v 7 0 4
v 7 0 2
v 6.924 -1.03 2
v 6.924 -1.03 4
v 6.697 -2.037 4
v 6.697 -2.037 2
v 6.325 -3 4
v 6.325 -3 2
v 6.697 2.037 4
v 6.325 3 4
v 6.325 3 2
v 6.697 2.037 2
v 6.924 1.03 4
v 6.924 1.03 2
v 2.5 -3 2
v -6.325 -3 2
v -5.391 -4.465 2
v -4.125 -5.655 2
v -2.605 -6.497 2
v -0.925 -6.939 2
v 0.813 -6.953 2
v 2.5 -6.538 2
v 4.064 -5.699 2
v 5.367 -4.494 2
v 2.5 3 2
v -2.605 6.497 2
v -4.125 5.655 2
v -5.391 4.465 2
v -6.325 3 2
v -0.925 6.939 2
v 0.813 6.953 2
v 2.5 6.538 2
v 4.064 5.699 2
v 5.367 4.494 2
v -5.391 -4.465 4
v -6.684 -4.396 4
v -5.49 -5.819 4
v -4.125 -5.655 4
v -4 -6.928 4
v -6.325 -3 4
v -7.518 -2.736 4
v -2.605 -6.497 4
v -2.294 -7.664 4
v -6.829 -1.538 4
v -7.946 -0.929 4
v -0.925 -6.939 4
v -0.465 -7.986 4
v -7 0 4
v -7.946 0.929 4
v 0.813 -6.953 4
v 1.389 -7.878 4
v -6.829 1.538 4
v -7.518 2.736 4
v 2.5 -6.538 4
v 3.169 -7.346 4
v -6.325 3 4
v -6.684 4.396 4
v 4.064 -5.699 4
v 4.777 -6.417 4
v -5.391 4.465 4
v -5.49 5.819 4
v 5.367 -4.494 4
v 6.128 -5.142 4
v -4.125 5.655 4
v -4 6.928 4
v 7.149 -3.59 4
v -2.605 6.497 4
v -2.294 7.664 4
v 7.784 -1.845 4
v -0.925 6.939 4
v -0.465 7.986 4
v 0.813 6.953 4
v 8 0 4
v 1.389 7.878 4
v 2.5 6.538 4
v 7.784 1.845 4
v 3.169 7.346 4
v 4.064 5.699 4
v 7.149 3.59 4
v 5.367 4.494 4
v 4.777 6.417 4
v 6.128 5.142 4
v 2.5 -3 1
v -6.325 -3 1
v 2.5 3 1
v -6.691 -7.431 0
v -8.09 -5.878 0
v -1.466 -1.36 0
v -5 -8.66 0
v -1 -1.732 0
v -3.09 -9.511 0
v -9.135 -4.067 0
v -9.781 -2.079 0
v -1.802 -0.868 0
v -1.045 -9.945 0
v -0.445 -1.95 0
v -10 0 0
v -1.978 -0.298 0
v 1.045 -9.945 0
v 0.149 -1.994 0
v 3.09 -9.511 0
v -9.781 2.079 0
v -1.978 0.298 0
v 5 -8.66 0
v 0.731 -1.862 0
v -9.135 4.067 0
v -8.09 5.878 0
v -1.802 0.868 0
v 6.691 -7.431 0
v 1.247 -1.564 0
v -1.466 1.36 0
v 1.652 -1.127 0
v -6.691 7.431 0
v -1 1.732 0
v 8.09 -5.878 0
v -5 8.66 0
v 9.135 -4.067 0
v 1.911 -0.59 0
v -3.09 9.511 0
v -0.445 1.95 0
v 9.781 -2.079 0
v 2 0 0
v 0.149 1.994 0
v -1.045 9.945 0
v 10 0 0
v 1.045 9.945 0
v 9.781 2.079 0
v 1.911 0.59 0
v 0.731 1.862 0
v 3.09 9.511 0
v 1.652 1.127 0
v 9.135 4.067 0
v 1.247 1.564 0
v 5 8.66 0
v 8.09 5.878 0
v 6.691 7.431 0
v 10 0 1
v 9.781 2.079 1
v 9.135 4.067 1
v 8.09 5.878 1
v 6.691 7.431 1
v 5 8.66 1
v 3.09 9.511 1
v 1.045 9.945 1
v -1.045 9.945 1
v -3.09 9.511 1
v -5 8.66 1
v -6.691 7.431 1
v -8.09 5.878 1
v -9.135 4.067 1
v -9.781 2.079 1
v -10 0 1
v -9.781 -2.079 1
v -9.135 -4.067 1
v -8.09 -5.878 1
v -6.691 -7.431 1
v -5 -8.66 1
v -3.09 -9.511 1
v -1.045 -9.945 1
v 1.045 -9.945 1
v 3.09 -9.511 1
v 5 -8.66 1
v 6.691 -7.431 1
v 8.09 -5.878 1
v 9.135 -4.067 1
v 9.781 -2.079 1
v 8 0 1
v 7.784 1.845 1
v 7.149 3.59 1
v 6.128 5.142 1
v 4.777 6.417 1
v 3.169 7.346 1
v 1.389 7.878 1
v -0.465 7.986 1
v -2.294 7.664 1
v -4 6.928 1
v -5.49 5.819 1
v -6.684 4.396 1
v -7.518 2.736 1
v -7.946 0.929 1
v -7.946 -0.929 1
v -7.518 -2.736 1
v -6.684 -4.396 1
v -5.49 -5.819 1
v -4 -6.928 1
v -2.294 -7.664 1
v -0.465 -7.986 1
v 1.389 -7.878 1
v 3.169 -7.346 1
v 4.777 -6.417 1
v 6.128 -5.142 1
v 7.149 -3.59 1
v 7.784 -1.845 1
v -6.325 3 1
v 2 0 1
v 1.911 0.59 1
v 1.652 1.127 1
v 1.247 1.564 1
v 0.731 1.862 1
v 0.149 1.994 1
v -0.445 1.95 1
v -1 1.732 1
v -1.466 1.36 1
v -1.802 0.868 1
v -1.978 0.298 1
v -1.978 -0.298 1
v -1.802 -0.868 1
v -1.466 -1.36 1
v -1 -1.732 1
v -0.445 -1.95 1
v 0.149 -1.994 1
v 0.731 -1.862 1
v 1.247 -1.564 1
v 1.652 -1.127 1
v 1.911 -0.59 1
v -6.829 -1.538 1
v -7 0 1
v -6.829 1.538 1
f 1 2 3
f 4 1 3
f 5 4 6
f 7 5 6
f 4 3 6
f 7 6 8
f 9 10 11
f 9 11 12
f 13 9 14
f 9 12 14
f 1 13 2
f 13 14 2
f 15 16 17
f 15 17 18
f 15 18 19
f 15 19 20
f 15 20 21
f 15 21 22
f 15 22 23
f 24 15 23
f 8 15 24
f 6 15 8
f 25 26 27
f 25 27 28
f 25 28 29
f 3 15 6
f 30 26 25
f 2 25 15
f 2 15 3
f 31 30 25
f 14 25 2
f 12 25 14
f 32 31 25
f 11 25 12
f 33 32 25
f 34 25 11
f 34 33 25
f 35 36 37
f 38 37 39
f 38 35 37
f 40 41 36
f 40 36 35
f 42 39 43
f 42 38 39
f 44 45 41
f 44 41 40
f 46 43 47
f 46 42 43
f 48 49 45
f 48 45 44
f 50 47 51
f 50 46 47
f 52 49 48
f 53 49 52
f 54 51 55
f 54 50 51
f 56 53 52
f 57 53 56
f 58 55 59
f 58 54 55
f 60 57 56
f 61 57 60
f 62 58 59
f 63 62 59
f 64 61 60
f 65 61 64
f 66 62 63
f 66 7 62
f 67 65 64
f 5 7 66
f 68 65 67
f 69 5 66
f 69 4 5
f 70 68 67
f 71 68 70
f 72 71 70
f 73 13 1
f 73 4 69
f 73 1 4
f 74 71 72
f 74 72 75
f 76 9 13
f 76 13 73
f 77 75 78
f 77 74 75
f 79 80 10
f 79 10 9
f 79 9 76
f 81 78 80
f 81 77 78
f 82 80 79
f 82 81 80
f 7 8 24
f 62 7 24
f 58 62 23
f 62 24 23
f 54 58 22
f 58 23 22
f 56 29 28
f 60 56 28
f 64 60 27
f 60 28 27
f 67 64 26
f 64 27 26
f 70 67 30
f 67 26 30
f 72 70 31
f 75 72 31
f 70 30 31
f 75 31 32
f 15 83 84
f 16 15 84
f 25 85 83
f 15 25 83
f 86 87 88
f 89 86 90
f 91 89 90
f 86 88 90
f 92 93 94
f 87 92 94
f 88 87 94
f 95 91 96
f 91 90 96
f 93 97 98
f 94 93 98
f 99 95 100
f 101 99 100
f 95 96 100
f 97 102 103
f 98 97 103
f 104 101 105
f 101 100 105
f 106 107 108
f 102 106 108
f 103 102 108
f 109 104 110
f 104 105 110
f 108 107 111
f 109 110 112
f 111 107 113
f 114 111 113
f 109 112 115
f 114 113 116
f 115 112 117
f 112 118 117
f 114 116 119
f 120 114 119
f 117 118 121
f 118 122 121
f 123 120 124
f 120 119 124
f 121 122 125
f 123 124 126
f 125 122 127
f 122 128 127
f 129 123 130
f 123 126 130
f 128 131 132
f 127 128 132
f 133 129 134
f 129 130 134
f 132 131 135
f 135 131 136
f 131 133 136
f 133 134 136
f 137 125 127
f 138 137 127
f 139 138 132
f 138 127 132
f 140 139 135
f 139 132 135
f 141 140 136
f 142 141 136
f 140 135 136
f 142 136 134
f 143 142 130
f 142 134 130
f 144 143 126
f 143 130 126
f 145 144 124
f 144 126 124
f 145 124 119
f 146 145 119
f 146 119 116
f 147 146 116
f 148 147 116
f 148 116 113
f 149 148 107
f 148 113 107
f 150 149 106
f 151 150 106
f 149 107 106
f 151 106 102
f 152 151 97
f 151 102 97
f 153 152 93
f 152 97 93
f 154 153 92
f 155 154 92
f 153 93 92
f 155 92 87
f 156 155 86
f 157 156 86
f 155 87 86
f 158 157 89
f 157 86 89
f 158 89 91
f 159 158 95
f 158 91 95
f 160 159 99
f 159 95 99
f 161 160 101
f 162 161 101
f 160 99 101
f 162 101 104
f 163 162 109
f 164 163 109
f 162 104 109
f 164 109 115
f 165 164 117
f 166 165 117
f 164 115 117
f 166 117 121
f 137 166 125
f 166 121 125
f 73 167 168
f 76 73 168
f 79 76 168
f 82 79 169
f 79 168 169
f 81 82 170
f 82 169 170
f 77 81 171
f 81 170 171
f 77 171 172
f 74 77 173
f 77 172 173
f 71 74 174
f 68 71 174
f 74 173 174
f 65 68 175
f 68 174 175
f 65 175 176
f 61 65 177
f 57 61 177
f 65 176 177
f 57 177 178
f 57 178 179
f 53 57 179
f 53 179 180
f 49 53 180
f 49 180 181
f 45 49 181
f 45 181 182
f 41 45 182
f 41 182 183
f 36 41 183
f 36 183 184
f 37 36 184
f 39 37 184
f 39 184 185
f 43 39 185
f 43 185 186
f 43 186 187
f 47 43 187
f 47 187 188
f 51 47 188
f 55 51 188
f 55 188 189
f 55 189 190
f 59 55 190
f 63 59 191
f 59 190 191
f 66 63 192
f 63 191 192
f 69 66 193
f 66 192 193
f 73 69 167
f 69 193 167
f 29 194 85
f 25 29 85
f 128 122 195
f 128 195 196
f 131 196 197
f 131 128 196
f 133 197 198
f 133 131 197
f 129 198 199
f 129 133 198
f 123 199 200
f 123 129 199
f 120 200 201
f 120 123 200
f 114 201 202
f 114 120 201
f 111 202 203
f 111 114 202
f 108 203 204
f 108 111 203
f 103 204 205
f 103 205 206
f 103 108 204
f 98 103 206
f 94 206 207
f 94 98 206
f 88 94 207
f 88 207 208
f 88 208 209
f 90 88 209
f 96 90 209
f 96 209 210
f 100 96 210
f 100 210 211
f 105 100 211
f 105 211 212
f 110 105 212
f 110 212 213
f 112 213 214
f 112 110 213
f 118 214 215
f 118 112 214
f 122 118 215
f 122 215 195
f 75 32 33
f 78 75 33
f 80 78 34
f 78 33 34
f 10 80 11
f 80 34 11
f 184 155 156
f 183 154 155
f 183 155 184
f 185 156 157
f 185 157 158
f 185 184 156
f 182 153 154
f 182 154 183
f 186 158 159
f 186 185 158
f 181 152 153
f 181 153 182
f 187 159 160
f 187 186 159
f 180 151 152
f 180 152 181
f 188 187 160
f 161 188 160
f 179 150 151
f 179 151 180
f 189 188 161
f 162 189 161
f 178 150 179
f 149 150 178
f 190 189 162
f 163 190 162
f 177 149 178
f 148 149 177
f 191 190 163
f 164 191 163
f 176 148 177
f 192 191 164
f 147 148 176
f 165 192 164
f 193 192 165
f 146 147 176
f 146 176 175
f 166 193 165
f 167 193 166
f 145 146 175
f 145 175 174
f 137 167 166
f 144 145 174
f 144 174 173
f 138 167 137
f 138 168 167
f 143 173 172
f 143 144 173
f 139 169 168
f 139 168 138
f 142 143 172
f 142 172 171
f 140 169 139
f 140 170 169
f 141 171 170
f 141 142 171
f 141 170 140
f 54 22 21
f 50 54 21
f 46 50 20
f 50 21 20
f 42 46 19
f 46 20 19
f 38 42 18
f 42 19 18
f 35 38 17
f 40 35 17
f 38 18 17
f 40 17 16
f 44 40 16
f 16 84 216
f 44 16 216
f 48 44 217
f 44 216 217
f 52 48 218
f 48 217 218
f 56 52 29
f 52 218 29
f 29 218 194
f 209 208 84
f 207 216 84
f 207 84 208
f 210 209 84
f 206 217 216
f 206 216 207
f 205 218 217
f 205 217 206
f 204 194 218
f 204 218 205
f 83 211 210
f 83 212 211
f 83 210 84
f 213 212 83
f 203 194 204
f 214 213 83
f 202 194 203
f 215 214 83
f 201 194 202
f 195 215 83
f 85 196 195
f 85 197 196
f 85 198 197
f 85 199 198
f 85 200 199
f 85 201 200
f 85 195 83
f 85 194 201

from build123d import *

# Parameters (mm, degrees)
F0_R     = 10
F0_R_2   = 8
F0_R_3   = 2
F1_DEPTH = 1
F2_DEPTH = 4
F3_DEPTH = 2


with BuildPart() as f1:
    # F0 (on Top) → F1 (new body)
    with BuildSketch(Plane.XY):
        Circle(F0_R)
        Circle(F0_R_2, mode=Mode.SUBTRACT)
        Circle(F0_R_2)
        with BuildLine():
            ThreePointArc((6.3245553203, 3), (6.8290514437, 1.5375488216), (7, 0))
            ThreePointArc((7, 0), (6.8290514437, -1.5375488216), (6.3245553203, -3))
            ThreePointArc((6.3245553203, -3), (4.7537534147, -5.1382709614), (2.5, -6.5383484153))
            ThreePointArc((2.5, -6.5383484153), (-2.6051455289, -6.4971699049), (-6.3245553203, -3))
            ThreePointArc((-6.3245553203, -3), (-7, 0), (-6.3245553203, 3))
            ThreePointArc((-6.3245553203, 3), (-2.6051455289, 6.4971699049), (2.5, 6.5383484153))
            ThreePointArc((2.5, 6.5383484153), (4.7537534147, 5.1382709614), (6.3245553203, 3))
        make_face(mode=Mode.SUBTRACT)
        with BuildLine():
            Line((2.5, -3), (2.5, 3))
            Line((2.5, 3), (-6.3245553203, 3))
            ThreePointArc((-6.3245553203, 3), (-7, 0), (-6.3245553203, -3))
            Line((-6.3245553203, -3), (2.5, -3))
        make_face()
        Circle(F0_R_3, mode=Mode.SUBTRACT)
        with BuildLine():
            Line((2.5, 3), (2.5, 6.5383484153))
            ThreePointArc((2.5, 6.5383484153), (-2.6051455289, 6.4971699049), (-6.3245553203, 3))
            Line((-6.3245553203, 3), (2.5, 3))
        make_face()
        with BuildLine():
            ThreePointArc((-6.3245553203, -3), (-2.6051455289, -6.4971699049), (2.5, -6.5383484153))
            Line((2.5, -6.5383484153), (2.5, -3))
            Line((2.5, -3), (-6.3245553203, -3))
        make_face()
        with BuildLine():
            ThreePointArc((6.3245553203, -3), (6.8290514437, -1.5375488216), (7, 0))
            ThreePointArc((7, 0), (6.8290514437, 1.5375488216), (6.3245553203, 3))
            Line((6.3245553203, 3), (2.5, 3))
            Line((2.5, 3), (2.5, -3))
            Line((2.5, -3), (6.3245553203, -3))
        make_face()
        with BuildLine():
            Line((2.5, 3), (6.3245553203, 3))
            ThreePointArc((6.3245553203, 3), (4.7537534147, 5.1382709614), (2.5, 6.5383484153))
            Line((2.5, 6.5383484153), (2.5, 3))
        make_face()
        with BuildLine():
            ThreePointArc((2.5, -6.5383484153), (4.7537534147, -5.1382709614), (6.3245553203, -3))
            Line((6.3245553203, -3), (2.5, -3))
            Line((2.5, -3), (2.5, -6.5383484153))
        make_face()
    extrude(amount=F1_DEPTH)

    # F0 (on Top) → F2 (join)
    with BuildSketch(Plane.XY):
        Circle(F0_R_2)
        with BuildLine():
            ThreePointArc((6.3245553203, 3), (6.8290514437, 1.5375488216), (7, 0))
            ThreePointArc((7, 0), (6.8290514437, -1.5375488216), (6.3245553203, -3))
            ThreePointArc((6.3245553203, -3), (4.7537534147, -5.1382709614), (2.5, -6.5383484153))
            ThreePointArc((2.5, -6.5383484153), (-2.6051455289, -6.4971699049), (-6.3245553203, -3))
            ThreePointArc((-6.3245553203, -3), (-7, 0), (-6.3245553203, 3))
            ThreePointArc((-6.3245553203, 3), (-2.6051455289, 6.4971699049), (2.5, 6.5383484153))
            ThreePointArc((2.5, 6.5383484153), (4.7537534147, 5.1382709614), (6.3245553203, 3))
        make_face(mode=Mode.SUBTRACT)
    extrude(amount=F2_DEPTH)

    # F0 (on Top) → F3 (join)
    with BuildSketch(Plane.XY):
        with BuildLine():
            Line((2.5, 3), (2.5, 6.5383484153))
            ThreePointArc((2.5, 6.5383484153), (-2.6051455289, 6.4971699049), (-6.3245553203, 3))
            Line((-6.3245553203, 3), (2.5, 3))
        make_face()
        with BuildLine():
            Line((2.5, 3), (6.3245553203, 3))
            ThreePointArc((6.3245553203, 3), (4.7537534147, 5.1382709614), (2.5, 6.5383484153))
            Line((2.5, 6.5383484153), (2.5, 3))
        make_face()
        with BuildLine():
            ThreePointArc((6.3245553203, -3), (6.8290514437, -1.5375488216), (7, 0))
            ThreePointArc((7, 0), (6.8290514437, 1.5375488216), (6.3245553203, 3))
            Line((6.3245553203, 3), (2.5, 3))
            Line((2.5, 3), (2.5, -3))
            Line((2.5, -3), (6.3245553203, -3))
        make_face()
        with BuildLine():
            ThreePointArc((2.5, -6.5383484153), (4.7537534147, -5.1382709614), (6.3245553203, -3))
            Line((6.3245553203, -3), (2.5, -3))
            Line((2.5, -3), (2.5, -6.5383484153))
        make_face()
        with BuildLine():
            ThreePointArc((-6.3245553203, -3), (-2.6051455289, -6.4971699049), (2.5, -6.5383484153))
            Line((2.5, -6.5383484153), (2.5, -3))
            Line((2.5, -3), (-6.3245553203, -3))
        make_face()
    extrude(amount=F3_DEPTH)


solid = f1.part
